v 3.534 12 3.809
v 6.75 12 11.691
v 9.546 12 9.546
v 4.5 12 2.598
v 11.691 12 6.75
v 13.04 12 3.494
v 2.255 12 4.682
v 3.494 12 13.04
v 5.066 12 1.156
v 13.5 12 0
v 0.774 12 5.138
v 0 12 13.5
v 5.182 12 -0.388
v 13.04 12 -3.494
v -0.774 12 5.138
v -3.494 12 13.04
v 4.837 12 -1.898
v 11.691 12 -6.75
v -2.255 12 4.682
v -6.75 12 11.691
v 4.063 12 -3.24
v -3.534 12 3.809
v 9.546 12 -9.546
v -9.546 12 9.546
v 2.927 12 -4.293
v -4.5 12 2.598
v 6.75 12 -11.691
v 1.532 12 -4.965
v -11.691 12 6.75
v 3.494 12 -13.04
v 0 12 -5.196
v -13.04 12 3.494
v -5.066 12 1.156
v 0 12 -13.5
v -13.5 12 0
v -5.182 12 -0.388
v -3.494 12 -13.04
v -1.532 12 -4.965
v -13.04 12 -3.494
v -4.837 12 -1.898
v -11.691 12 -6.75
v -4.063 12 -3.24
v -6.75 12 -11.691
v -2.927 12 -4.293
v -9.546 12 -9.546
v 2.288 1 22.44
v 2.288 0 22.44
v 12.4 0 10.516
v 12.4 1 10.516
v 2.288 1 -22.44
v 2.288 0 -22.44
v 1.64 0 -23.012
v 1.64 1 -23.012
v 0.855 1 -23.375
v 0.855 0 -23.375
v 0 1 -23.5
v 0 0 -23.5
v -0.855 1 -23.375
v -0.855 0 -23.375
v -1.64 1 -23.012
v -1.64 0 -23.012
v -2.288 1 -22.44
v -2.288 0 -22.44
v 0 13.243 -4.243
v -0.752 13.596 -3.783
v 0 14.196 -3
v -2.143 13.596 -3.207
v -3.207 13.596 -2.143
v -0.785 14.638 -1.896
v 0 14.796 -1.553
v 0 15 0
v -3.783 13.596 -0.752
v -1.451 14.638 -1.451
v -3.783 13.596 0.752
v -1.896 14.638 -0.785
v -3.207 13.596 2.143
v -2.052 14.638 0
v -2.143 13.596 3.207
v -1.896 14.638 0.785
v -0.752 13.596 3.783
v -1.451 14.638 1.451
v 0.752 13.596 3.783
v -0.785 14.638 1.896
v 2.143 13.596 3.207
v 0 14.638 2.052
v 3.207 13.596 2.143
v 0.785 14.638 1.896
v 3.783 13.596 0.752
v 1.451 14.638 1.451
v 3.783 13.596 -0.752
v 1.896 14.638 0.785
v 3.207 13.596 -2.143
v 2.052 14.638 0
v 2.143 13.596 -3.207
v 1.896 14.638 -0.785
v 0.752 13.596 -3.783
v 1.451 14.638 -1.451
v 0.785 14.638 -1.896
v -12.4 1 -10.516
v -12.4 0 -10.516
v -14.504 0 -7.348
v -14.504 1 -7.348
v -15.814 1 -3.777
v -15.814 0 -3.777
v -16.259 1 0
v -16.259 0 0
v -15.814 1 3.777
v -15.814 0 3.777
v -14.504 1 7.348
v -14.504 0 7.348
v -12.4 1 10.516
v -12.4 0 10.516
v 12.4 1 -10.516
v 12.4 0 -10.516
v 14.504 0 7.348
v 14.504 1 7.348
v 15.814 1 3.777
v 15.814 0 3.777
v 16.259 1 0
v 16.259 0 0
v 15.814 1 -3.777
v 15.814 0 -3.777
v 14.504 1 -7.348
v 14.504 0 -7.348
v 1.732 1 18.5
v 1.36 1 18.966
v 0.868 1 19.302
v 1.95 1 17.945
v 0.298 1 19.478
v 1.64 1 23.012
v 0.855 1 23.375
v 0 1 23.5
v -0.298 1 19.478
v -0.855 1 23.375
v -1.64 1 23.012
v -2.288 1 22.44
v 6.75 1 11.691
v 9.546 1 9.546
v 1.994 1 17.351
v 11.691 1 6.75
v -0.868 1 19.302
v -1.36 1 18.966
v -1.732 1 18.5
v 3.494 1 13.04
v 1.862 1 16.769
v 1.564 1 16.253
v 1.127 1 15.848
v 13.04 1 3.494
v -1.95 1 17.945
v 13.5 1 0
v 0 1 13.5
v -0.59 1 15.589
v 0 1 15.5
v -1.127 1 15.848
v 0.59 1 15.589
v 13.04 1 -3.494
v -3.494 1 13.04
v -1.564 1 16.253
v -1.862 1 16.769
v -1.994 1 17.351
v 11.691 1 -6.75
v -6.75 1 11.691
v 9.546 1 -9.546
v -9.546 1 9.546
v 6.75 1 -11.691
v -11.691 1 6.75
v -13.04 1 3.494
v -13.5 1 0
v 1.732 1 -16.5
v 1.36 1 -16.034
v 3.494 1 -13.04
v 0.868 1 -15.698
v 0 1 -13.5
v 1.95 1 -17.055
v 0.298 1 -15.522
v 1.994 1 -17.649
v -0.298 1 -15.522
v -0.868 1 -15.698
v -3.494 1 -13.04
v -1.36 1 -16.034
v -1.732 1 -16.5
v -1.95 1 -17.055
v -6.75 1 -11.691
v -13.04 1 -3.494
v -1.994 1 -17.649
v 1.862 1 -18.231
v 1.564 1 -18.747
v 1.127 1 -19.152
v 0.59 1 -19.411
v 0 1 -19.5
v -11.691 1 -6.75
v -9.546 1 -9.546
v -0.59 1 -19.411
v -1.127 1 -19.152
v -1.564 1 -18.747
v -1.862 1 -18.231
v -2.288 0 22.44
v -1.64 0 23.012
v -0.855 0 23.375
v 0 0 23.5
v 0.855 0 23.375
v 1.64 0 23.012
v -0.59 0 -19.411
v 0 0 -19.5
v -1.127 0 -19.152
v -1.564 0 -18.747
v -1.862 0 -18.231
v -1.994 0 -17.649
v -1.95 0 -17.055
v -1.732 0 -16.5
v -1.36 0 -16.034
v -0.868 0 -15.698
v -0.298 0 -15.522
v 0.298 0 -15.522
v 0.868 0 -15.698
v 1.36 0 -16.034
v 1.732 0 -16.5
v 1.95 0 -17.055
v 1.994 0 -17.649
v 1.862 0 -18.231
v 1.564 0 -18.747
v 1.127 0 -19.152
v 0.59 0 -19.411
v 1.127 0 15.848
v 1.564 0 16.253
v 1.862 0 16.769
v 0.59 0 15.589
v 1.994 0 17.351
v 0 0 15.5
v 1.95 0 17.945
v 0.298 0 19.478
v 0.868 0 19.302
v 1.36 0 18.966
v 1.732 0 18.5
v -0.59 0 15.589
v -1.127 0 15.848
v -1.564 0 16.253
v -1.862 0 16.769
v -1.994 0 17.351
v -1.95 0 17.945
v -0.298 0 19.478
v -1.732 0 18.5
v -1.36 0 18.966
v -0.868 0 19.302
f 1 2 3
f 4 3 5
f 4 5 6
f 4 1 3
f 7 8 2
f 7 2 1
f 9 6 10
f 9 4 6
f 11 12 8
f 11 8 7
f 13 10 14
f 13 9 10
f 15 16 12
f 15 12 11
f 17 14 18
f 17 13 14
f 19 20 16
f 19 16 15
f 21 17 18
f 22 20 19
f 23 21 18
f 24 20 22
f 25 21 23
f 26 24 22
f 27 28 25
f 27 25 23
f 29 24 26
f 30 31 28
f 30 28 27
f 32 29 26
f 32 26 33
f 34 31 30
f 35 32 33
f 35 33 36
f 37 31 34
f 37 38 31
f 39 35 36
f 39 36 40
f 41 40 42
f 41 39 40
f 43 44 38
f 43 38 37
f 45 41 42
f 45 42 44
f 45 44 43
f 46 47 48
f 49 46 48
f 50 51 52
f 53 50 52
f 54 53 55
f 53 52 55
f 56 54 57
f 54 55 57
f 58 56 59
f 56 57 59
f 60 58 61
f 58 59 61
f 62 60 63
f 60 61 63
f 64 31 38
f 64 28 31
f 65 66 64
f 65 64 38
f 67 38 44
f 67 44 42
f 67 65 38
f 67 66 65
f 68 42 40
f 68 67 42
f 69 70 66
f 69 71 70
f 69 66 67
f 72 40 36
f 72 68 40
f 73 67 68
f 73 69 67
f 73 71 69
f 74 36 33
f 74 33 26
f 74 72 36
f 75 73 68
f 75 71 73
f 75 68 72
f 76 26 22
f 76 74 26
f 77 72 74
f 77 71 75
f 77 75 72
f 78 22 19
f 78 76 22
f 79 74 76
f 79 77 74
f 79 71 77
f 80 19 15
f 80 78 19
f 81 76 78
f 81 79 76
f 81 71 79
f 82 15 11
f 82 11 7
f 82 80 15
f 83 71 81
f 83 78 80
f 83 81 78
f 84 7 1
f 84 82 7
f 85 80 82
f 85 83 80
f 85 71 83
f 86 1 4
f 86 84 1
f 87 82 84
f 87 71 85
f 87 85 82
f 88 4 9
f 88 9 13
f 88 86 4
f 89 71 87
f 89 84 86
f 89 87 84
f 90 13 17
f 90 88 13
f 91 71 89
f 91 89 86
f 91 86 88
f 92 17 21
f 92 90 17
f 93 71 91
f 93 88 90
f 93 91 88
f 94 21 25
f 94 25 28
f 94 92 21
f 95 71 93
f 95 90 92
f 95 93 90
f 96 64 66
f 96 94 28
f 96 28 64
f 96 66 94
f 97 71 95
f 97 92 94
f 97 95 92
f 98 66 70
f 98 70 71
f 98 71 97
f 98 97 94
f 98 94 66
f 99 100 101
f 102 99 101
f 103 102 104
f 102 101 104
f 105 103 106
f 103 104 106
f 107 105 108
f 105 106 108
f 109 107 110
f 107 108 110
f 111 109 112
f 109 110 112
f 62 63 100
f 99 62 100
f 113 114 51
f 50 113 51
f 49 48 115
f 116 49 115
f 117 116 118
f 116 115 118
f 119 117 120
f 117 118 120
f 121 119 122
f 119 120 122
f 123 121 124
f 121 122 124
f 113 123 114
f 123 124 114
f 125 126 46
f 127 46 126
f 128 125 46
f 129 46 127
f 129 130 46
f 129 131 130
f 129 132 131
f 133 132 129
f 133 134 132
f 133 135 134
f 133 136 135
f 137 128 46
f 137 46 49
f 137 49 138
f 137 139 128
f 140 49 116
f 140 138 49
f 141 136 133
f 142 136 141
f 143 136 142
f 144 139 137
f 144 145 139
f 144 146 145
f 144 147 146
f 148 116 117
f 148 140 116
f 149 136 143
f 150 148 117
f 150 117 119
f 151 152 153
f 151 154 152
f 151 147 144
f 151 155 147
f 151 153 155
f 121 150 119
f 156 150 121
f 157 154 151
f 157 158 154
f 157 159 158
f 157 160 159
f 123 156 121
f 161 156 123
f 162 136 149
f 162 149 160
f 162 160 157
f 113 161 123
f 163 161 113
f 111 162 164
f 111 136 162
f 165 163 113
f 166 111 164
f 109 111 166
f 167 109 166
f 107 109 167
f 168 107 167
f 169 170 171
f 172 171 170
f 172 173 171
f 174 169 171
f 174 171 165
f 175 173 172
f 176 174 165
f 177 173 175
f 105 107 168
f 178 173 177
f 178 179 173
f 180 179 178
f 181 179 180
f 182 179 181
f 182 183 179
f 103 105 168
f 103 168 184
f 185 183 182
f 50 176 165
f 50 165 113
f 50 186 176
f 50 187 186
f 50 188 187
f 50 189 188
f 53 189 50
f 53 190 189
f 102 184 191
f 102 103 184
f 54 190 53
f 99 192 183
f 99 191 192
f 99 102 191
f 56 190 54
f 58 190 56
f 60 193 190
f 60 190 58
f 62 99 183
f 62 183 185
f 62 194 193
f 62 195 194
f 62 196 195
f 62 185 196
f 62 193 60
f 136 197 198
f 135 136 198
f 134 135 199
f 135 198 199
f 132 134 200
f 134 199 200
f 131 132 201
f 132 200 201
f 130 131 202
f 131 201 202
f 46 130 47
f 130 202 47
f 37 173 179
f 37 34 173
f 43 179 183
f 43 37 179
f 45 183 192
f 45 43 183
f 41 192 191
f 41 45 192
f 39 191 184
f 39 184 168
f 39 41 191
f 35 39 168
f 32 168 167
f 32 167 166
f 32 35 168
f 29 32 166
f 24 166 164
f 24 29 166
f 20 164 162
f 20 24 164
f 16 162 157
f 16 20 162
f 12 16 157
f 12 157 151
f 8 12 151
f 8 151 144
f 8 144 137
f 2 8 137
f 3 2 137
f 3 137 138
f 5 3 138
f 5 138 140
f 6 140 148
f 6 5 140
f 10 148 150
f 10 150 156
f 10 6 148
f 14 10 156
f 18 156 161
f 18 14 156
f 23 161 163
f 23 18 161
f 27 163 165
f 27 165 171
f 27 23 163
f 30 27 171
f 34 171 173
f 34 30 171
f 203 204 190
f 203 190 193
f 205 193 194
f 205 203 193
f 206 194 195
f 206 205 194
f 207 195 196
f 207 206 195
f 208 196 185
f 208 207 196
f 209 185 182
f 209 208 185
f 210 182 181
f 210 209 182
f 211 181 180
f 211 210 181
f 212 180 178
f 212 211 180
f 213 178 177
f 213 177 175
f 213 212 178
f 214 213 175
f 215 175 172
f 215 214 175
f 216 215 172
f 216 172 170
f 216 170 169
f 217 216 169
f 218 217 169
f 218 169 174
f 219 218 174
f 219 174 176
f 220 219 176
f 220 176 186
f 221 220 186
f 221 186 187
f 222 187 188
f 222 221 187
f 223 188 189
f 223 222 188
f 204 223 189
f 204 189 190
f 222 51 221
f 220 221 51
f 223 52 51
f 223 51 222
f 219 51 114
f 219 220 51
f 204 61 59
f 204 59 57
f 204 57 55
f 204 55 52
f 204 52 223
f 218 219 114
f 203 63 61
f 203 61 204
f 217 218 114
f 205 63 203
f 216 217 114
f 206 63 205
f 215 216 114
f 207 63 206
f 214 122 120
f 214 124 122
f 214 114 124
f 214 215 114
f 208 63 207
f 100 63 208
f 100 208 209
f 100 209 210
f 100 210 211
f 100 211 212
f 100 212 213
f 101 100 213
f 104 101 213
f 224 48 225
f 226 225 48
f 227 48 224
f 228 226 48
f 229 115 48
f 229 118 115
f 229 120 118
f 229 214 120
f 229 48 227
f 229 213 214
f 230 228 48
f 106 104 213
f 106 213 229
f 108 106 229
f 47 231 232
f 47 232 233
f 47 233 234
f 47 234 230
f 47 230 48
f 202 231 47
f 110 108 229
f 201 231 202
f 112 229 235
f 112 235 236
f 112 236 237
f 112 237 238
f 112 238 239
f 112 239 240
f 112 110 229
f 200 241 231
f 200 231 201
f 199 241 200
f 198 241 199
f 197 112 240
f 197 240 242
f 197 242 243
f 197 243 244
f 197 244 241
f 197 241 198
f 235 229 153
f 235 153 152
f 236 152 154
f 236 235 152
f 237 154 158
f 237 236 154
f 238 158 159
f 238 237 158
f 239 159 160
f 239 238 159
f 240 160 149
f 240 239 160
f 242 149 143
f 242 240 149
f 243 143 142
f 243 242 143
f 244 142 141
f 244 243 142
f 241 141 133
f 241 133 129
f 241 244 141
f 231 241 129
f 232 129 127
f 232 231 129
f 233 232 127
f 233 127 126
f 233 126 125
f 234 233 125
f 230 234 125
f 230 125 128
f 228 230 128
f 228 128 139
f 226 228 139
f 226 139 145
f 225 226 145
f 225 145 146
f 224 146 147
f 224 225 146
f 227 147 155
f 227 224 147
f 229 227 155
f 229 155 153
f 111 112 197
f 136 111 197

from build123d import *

# Parameters (mm, degrees)
SKETCH_3_R          = 2
CUT_EXTRUDE_4_DEPTH = 1
SKETCH_5_R          = 33.306153754
CUT_EXTRUDE_5_DEPTH = 1


with BuildPart() as part:
    # 草图1 → 旋转2 (revolve)
    with BuildSketch(Plane(origin=(0, 0, 0), x_dir=(0, 0, -1), z_dir=(1, 0, 0)), mode=Mode.PRIVATE) as revolve_2_sk:
        with BuildLine():
            Line((0, 0), (-23.5, 0))
            Line((-23.5, 0), (-23.5, 1))
            Line((-23.5, 1), (-13.5, 1))
            Line((-13.5, 1), (-13.5, 12))
            Line((-13.5, 12), (-5.196152423, 12))
            ThreePointArc((-5.196152423, 12), (-3, 14.196152423), (0, 15))
            Line((0, 15), (0, 9))
            Line((0, 9), (0, 0))
        make_face()
    revolve(revolve_2_sk.sketch.rotate(Axis((0, 0, 0), (0, 1, 0)), 180), axis=Axis((0, 0, 0), (0, 1, 0)))

    # 草图3 → 切除-拉伸4 (cut)
    with BuildSketch(Plane(origin=(0, 0, 0), x_dir=(1, 0, 0), z_dir=(0, 1, 0))):
        with Locations(Location((0, 17.5, 0), (0, 0, 90))):
            Circle(SKETCH_3_R)
        with Locations(Location((0, -17.5, 0), (0, 0, 90))):
            Circle(SKETCH_3_R)
    extrude(amount=CUT_EXTRUDE_4_DEPTH, mode=Mode.SUBTRACT)

    # 草图5 → 切除-拉伸5 (cut)
    with BuildSketch(Plane(origin=(0, 0, 0), x_dir=(1, 0, 0), z_dir=(0, 1, 0))):
        Circle(SKETCH_5_R)
        with BuildLine():
            Line((2.288026903, -22.440343498), (12.400353743, -10.516023969))
            ThreePointArc((12.400353743, -10.516023969), (16.259013902, 0), (12.400353743, 10.516023969))
            Line((12.400353743, 10.516023969), (2.288026903, 22.440343498))
            ThreePointArc((2.288026903, 22.440343498), (0, 23.5), (-2.288026903, 22.440343498))
            Line((-2.288026903, 22.440343498), (-12.400353743, 10.516023969))
            ThreePointArc((-12.400353743, 10.516023969), (-16.259013902, 0), (-12.400353743, -10.516023969))
            Line((-12.400353743, -10.516023969), (-2.288026903, -22.440343498))
            ThreePointArc((-2.288026903, -22.440343498), (0, -23.5), (2.288026903, -22.440343498))
        make_face(mode=Mode.SUBTRACT)
    extrude(amount=CUT_EXTRUDE_5_DEPTH, mode=Mode.SUBTRACT)


solid = part.part
